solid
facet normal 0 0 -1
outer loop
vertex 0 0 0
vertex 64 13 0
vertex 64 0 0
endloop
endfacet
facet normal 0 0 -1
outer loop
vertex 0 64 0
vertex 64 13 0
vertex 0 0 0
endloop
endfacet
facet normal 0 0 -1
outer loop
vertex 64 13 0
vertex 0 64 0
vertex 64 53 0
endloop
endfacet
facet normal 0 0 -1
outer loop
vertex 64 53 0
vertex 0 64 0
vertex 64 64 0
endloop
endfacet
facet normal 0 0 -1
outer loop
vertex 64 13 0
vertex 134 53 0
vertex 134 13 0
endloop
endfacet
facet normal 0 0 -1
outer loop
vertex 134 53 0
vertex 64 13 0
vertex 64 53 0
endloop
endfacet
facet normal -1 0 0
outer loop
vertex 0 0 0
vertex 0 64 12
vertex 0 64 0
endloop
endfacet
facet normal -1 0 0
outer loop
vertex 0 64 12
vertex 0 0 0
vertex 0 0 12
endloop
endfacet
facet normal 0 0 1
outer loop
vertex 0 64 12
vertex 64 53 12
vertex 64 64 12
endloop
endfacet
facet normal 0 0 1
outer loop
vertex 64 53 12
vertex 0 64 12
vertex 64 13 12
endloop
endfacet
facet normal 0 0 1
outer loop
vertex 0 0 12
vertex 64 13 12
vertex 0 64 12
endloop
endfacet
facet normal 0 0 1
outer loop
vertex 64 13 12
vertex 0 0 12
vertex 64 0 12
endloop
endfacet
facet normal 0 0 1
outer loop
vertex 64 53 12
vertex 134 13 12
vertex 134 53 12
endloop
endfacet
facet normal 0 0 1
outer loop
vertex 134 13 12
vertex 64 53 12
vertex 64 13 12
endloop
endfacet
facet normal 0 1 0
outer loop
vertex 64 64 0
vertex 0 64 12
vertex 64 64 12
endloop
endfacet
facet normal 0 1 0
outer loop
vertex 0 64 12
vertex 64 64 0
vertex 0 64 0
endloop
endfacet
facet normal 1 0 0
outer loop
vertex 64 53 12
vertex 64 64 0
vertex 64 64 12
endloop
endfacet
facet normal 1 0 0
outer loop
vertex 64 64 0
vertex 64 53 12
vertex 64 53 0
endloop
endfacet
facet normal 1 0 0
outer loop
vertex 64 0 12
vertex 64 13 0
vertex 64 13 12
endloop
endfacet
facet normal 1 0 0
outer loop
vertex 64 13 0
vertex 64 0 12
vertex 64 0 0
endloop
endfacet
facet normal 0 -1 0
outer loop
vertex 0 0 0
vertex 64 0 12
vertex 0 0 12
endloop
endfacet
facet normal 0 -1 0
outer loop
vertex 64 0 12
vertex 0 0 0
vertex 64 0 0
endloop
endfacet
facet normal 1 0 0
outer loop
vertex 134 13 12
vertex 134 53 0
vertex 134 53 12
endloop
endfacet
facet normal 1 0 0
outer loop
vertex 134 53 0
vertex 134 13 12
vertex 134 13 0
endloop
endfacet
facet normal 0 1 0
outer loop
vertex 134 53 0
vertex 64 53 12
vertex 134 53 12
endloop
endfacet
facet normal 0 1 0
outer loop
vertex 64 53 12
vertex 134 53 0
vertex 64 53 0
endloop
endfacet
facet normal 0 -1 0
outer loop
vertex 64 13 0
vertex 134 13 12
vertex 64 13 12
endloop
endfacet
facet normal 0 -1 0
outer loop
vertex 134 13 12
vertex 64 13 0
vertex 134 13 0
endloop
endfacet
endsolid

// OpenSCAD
$fn= 200;

linear_extrude(12) 
base();

//difference(){
//    base();
//    }
    
//union(){
//base();
manija();
//}
    
module base(){
    square(64,12,30);
    }
    
module manija(){
    translate([64,13,0])
    cube([70,40,12]);
    }
